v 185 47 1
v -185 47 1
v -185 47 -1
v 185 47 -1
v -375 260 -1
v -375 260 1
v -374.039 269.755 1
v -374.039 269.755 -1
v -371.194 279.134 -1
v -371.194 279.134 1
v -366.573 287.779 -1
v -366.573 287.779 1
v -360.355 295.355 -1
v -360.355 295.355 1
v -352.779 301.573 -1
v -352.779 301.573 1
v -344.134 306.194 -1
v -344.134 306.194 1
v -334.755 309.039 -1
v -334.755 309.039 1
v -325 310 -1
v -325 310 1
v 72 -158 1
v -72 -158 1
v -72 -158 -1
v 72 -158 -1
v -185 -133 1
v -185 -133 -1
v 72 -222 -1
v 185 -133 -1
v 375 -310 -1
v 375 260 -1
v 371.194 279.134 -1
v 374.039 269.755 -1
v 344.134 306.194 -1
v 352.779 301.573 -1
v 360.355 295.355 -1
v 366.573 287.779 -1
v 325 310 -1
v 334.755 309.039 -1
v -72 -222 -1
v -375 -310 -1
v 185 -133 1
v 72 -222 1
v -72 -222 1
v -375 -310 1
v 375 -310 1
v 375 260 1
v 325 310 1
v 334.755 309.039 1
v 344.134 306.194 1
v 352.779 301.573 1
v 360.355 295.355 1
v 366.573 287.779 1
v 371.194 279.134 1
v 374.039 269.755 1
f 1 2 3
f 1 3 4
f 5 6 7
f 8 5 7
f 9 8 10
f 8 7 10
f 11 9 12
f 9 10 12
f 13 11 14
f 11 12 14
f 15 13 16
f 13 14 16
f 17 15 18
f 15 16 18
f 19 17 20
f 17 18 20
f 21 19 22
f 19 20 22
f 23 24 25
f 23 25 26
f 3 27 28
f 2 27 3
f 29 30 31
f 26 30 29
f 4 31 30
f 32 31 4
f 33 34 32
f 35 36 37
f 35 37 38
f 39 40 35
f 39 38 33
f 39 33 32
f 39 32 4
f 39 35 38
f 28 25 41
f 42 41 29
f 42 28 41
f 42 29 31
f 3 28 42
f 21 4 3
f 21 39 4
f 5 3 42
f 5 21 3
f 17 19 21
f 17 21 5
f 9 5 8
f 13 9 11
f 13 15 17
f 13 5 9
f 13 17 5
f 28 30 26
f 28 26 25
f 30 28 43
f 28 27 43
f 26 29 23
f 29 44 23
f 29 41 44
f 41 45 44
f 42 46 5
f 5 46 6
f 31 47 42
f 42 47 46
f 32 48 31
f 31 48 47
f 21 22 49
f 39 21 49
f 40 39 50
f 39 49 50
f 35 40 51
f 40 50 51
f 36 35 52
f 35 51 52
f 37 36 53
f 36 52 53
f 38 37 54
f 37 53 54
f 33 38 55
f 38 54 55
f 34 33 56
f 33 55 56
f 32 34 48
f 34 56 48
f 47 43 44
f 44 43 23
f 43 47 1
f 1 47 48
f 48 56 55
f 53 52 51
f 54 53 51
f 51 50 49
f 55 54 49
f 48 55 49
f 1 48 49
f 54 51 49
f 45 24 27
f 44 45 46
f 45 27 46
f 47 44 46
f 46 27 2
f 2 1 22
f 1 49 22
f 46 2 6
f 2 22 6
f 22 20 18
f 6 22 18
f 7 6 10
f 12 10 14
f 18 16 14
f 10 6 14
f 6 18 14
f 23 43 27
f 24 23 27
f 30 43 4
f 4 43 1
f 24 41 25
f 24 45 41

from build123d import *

# Parameters (mm, degrees)
SKETCH1_W           = 144
SKETCH1_H           = 64
SKETCH1_W_2         = 370
SKETCH1_H_2         = 180
BOSS_EXTRUDE1_DEPTH = 1


with BuildPart() as part:
    # Sketch1 → Boss-Extrude1 (new, symmetric)
    with BuildSketch(Plane.XY):
        with BuildLine():
            Line((-325, 310), (325, 310))
            ThreePointArc((325, 310), (360.355339059, 295.355339059), (375, 260))
            Line((375, 260), (375, -310))
            Line((375, -310), (-375, -310))
            Line((-375, -310), (-375, 260))
            ThreePointArc((-375, 260), (-360.355339059, 295.355339059), (-325, 310))
        make_face()
        with Locations((0, -190)):
            Rectangle(SKETCH1_W, SKETCH1_H, mode=Mode.SUBTRACT)
        with Locations((0, -43)):
            Rectangle(SKETCH1_W_2, SKETCH1_H_2, mode=Mode.SUBTRACT)
    extrude(amount=BOSS_EXTRUDE1_DEPTH, both=True)


solid = part.part
